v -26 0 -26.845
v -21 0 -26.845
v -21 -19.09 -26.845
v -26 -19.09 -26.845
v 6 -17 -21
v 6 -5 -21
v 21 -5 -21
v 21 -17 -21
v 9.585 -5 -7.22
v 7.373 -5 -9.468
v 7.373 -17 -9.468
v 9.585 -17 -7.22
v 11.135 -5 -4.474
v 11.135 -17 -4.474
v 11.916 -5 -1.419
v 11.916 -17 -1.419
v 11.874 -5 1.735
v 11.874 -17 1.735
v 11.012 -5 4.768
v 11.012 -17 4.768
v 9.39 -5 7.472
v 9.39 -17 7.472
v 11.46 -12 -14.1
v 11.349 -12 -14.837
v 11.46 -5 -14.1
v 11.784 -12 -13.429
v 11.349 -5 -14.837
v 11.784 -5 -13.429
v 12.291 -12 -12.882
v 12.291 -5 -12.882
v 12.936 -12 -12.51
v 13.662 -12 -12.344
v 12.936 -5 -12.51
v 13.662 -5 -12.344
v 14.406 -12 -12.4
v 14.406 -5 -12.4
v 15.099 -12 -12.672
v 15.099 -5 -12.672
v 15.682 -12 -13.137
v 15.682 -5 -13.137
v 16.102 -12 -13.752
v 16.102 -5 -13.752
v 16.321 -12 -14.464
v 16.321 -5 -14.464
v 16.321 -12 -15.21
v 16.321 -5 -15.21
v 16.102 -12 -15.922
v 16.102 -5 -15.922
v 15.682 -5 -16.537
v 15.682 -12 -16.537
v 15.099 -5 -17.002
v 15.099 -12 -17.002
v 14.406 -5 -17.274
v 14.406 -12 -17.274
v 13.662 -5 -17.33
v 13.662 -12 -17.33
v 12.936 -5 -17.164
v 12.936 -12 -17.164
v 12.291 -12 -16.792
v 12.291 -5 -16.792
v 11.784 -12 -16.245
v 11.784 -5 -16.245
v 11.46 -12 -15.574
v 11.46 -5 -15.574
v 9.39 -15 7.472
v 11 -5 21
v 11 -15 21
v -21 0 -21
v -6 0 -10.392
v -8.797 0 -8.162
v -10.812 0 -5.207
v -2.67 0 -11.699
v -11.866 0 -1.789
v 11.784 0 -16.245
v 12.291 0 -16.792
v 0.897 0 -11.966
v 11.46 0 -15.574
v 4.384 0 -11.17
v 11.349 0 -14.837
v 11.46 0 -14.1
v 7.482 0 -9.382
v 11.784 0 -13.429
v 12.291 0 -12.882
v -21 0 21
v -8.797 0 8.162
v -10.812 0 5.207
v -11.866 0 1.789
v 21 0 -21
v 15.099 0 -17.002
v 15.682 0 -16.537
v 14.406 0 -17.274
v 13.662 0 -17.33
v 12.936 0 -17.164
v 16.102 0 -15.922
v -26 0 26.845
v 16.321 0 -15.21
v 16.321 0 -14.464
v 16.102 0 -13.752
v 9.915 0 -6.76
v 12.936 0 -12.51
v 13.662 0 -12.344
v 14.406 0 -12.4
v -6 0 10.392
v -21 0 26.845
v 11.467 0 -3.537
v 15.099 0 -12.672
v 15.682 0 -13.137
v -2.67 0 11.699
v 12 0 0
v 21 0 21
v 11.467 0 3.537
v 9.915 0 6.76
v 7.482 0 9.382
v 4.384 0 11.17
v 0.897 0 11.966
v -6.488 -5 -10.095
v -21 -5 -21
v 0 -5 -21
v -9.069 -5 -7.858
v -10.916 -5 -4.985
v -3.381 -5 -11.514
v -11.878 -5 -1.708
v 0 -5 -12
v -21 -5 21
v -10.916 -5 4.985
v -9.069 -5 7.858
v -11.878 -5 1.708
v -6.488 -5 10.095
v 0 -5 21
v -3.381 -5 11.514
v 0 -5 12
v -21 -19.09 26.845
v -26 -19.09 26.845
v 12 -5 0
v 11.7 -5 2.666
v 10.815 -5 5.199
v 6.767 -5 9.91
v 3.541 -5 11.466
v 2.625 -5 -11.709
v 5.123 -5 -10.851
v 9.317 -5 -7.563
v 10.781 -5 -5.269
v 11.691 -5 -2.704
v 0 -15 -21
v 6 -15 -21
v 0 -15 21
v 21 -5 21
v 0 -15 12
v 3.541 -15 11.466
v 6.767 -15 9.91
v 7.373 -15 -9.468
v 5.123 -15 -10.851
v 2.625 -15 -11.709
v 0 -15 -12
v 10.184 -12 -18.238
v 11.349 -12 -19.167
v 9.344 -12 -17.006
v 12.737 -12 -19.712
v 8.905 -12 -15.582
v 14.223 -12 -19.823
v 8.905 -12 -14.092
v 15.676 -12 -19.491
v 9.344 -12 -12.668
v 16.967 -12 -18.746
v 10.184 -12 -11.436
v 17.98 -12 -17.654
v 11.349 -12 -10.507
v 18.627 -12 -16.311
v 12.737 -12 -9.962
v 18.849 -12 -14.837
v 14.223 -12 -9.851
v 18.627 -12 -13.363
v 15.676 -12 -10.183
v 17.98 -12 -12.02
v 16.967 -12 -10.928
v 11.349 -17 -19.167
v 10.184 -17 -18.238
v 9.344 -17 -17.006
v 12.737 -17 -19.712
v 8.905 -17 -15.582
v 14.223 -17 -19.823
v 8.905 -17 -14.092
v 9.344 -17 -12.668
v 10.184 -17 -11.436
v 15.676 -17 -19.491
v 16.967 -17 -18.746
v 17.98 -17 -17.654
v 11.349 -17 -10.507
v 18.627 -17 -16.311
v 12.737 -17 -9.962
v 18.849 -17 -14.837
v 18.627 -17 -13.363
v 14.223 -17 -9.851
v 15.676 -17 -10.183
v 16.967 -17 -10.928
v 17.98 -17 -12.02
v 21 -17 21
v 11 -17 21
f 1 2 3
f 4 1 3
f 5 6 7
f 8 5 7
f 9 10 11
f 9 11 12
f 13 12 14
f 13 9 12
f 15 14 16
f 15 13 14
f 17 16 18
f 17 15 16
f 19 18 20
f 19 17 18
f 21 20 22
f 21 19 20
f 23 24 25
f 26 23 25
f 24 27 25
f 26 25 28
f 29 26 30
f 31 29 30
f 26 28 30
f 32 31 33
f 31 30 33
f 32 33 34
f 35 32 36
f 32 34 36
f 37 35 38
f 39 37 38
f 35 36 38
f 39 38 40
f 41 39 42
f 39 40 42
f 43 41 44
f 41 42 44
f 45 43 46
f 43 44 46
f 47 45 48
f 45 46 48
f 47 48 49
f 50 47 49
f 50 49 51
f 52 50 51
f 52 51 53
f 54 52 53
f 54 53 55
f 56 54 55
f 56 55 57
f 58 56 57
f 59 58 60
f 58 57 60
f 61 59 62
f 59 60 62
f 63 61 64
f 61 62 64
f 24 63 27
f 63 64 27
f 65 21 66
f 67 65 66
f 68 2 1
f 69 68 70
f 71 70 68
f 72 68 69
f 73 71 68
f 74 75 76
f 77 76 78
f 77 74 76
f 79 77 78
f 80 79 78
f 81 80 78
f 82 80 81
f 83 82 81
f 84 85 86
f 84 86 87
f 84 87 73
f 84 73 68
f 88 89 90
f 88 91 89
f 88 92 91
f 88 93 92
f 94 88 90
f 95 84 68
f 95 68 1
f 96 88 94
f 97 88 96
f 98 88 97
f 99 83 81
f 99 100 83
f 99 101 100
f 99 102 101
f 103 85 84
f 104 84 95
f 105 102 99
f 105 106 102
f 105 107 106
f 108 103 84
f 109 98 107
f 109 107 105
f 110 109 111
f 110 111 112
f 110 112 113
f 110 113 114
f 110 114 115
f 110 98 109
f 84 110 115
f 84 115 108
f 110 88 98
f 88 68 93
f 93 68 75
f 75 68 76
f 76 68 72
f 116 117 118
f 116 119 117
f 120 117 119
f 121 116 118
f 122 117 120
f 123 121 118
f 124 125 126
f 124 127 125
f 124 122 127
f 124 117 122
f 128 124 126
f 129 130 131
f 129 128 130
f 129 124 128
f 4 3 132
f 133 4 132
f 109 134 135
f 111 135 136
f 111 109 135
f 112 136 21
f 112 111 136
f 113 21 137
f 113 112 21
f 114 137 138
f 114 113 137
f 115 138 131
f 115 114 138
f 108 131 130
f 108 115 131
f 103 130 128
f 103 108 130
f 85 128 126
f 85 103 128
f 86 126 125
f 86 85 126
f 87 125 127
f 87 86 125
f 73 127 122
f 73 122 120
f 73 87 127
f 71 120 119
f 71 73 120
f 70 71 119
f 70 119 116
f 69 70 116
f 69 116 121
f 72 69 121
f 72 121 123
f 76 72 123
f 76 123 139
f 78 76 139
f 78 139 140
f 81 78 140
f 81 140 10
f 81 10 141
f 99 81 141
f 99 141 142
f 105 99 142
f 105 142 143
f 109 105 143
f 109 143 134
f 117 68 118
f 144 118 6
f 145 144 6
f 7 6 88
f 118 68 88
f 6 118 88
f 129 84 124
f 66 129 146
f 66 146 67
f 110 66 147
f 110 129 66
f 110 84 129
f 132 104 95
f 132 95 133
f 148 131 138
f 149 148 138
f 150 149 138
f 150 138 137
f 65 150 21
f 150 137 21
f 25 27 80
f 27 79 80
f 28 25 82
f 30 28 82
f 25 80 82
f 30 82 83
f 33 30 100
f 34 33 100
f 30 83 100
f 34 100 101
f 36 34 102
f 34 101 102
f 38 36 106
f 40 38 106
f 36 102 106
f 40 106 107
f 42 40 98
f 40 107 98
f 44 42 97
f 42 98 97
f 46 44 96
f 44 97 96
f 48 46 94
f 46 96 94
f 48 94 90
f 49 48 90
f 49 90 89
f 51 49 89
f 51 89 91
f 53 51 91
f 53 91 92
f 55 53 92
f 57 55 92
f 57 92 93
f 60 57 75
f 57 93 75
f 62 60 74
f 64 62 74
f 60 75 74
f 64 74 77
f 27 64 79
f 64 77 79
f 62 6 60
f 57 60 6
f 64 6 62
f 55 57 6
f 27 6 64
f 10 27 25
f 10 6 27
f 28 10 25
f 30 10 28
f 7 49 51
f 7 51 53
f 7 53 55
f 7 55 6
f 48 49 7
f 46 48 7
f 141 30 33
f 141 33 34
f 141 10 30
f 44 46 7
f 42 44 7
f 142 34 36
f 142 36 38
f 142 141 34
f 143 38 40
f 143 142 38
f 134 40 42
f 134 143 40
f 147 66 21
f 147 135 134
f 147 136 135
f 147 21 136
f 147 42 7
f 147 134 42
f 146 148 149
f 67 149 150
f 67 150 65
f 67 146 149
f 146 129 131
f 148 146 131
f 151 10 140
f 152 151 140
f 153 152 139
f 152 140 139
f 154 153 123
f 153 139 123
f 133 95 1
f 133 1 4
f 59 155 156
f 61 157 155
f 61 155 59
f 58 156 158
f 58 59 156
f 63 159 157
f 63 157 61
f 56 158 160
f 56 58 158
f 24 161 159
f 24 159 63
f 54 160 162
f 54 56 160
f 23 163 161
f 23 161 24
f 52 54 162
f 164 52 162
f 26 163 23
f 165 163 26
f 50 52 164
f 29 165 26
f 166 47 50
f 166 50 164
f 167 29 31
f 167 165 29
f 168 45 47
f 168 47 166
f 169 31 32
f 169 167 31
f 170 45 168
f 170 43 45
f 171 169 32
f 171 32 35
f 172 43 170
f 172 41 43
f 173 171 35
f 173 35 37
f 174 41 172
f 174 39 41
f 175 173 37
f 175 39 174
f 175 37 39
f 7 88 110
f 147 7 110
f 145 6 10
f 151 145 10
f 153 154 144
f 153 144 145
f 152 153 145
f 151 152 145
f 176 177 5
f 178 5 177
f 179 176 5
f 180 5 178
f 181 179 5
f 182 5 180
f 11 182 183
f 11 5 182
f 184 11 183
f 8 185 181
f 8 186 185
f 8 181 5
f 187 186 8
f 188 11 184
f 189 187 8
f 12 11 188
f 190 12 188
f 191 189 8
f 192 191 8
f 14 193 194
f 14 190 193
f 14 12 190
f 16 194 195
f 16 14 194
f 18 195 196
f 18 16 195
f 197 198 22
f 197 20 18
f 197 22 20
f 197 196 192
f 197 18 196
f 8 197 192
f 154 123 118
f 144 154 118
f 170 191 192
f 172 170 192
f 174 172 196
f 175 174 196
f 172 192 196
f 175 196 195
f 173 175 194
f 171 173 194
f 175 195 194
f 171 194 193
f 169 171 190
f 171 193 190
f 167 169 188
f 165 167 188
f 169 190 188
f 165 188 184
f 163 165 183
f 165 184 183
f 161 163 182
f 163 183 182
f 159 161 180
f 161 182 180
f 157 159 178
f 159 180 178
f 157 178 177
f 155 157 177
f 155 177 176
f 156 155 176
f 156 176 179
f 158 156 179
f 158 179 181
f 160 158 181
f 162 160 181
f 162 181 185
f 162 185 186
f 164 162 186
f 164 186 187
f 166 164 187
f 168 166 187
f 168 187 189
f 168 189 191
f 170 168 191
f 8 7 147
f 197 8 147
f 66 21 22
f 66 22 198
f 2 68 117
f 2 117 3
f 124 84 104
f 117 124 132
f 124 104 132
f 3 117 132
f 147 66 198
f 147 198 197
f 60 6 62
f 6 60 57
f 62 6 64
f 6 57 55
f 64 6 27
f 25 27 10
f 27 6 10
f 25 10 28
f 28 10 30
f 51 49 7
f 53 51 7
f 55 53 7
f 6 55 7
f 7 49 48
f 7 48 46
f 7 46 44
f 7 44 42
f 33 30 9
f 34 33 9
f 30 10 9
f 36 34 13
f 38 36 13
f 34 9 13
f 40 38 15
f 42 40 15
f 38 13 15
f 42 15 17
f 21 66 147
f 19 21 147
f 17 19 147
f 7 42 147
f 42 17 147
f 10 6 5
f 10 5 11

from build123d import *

# Parameters (mm, degrees)
F0_W             = 42
F0_H             = 42
F0_R             = 12
F1_DEPTH         = 5
F2_W             = 19.0896373242
F2_H             = 53.6900572479
F3_DEPTH         = 5
F5_DEPTH         = 10
F6_DEPTH         = 12
F8_D             = 5
F8_CBORE_D       = 10
F8_CBORE_DEPTH   = 5
F8_2_D           = 5
F8_2_CBORE_D     = 10
F8_2_CBORE_DEPTH = 5


with BuildPart() as f1:
    # F0 (on Front) → F1 (new body)
    with BuildSketch(Plane.XZ):
        Rectangle(F0_W, F0_H)
        Circle(F0_R, mode=Mode.SUBTRACT)
    extrude(amount=F1_DEPTH)

    # F2 (on face) → F3 (join)
    with BuildSketch(Plane(origin=(-21, 0, 0), x_dir=(0, -1, 0), z_dir=(-1, 0, 0))):
        with Locations((9.5448186621, 0)):
            Rectangle(F2_W, F2_H)
    extrude(amount=F3_DEPTH)

    # F4 (on face) → F5 (join)
    with BuildSketch(Plane.XZ.offset(5)):
        with BuildLine():
            Line((9.3895657925, 7.4723526569), (11, 21))
            Line((11, 21), (0, 21))
            Line((0, 21), (0, 12))
            ThreePointArc((0, 12), (5.2120901814, 10.8089831132), (9.3895657925, 7.4723526569))
        make_face()
        with BuildLine():
            Line((6, -21), (7.3728713232, -9.4678808849))
            ThreePointArc((7.3728713232, -9.4678808849), (3.8977833047, -11.3493297295), (0, -12))
            Line((0, -12), (0, -21))
            Line((0, -21), (6, -21))
        make_face()
    extrude(amount=F5_DEPTH)


with BuildPart() as f6:
    # F6 (new): a face of the model
    f6_faces = [f1.part.faces().sort_by_distance(p)[0] for p in [
        (15.0870554418, -5, -1.4200647771),
    ]]
    extrude(f6_faces, amount=F6_DEPTH)

    # F8#2 (through all)
    with Locations(Plane.XZ.offset(17)):
        with Locations((13.8492491096, -14.8369381204)):
            CounterBoreHole(F8_2_D / 2, F8_2_CBORE_D / 2, F8_2_CBORE_DEPTH)


with BuildPart() as f1_1:
    add(f1.part)

    # F8 (through all)
    with Locations(Plane.XZ.offset(17)):
        with Locations((13.8492491096, -14.8369381204)):
            CounterBoreHole(F8_D / 2, F8_CBORE_D / 2, F8_CBORE_DEPTH)


solid = Compound([f6.part, f1_1.part])
